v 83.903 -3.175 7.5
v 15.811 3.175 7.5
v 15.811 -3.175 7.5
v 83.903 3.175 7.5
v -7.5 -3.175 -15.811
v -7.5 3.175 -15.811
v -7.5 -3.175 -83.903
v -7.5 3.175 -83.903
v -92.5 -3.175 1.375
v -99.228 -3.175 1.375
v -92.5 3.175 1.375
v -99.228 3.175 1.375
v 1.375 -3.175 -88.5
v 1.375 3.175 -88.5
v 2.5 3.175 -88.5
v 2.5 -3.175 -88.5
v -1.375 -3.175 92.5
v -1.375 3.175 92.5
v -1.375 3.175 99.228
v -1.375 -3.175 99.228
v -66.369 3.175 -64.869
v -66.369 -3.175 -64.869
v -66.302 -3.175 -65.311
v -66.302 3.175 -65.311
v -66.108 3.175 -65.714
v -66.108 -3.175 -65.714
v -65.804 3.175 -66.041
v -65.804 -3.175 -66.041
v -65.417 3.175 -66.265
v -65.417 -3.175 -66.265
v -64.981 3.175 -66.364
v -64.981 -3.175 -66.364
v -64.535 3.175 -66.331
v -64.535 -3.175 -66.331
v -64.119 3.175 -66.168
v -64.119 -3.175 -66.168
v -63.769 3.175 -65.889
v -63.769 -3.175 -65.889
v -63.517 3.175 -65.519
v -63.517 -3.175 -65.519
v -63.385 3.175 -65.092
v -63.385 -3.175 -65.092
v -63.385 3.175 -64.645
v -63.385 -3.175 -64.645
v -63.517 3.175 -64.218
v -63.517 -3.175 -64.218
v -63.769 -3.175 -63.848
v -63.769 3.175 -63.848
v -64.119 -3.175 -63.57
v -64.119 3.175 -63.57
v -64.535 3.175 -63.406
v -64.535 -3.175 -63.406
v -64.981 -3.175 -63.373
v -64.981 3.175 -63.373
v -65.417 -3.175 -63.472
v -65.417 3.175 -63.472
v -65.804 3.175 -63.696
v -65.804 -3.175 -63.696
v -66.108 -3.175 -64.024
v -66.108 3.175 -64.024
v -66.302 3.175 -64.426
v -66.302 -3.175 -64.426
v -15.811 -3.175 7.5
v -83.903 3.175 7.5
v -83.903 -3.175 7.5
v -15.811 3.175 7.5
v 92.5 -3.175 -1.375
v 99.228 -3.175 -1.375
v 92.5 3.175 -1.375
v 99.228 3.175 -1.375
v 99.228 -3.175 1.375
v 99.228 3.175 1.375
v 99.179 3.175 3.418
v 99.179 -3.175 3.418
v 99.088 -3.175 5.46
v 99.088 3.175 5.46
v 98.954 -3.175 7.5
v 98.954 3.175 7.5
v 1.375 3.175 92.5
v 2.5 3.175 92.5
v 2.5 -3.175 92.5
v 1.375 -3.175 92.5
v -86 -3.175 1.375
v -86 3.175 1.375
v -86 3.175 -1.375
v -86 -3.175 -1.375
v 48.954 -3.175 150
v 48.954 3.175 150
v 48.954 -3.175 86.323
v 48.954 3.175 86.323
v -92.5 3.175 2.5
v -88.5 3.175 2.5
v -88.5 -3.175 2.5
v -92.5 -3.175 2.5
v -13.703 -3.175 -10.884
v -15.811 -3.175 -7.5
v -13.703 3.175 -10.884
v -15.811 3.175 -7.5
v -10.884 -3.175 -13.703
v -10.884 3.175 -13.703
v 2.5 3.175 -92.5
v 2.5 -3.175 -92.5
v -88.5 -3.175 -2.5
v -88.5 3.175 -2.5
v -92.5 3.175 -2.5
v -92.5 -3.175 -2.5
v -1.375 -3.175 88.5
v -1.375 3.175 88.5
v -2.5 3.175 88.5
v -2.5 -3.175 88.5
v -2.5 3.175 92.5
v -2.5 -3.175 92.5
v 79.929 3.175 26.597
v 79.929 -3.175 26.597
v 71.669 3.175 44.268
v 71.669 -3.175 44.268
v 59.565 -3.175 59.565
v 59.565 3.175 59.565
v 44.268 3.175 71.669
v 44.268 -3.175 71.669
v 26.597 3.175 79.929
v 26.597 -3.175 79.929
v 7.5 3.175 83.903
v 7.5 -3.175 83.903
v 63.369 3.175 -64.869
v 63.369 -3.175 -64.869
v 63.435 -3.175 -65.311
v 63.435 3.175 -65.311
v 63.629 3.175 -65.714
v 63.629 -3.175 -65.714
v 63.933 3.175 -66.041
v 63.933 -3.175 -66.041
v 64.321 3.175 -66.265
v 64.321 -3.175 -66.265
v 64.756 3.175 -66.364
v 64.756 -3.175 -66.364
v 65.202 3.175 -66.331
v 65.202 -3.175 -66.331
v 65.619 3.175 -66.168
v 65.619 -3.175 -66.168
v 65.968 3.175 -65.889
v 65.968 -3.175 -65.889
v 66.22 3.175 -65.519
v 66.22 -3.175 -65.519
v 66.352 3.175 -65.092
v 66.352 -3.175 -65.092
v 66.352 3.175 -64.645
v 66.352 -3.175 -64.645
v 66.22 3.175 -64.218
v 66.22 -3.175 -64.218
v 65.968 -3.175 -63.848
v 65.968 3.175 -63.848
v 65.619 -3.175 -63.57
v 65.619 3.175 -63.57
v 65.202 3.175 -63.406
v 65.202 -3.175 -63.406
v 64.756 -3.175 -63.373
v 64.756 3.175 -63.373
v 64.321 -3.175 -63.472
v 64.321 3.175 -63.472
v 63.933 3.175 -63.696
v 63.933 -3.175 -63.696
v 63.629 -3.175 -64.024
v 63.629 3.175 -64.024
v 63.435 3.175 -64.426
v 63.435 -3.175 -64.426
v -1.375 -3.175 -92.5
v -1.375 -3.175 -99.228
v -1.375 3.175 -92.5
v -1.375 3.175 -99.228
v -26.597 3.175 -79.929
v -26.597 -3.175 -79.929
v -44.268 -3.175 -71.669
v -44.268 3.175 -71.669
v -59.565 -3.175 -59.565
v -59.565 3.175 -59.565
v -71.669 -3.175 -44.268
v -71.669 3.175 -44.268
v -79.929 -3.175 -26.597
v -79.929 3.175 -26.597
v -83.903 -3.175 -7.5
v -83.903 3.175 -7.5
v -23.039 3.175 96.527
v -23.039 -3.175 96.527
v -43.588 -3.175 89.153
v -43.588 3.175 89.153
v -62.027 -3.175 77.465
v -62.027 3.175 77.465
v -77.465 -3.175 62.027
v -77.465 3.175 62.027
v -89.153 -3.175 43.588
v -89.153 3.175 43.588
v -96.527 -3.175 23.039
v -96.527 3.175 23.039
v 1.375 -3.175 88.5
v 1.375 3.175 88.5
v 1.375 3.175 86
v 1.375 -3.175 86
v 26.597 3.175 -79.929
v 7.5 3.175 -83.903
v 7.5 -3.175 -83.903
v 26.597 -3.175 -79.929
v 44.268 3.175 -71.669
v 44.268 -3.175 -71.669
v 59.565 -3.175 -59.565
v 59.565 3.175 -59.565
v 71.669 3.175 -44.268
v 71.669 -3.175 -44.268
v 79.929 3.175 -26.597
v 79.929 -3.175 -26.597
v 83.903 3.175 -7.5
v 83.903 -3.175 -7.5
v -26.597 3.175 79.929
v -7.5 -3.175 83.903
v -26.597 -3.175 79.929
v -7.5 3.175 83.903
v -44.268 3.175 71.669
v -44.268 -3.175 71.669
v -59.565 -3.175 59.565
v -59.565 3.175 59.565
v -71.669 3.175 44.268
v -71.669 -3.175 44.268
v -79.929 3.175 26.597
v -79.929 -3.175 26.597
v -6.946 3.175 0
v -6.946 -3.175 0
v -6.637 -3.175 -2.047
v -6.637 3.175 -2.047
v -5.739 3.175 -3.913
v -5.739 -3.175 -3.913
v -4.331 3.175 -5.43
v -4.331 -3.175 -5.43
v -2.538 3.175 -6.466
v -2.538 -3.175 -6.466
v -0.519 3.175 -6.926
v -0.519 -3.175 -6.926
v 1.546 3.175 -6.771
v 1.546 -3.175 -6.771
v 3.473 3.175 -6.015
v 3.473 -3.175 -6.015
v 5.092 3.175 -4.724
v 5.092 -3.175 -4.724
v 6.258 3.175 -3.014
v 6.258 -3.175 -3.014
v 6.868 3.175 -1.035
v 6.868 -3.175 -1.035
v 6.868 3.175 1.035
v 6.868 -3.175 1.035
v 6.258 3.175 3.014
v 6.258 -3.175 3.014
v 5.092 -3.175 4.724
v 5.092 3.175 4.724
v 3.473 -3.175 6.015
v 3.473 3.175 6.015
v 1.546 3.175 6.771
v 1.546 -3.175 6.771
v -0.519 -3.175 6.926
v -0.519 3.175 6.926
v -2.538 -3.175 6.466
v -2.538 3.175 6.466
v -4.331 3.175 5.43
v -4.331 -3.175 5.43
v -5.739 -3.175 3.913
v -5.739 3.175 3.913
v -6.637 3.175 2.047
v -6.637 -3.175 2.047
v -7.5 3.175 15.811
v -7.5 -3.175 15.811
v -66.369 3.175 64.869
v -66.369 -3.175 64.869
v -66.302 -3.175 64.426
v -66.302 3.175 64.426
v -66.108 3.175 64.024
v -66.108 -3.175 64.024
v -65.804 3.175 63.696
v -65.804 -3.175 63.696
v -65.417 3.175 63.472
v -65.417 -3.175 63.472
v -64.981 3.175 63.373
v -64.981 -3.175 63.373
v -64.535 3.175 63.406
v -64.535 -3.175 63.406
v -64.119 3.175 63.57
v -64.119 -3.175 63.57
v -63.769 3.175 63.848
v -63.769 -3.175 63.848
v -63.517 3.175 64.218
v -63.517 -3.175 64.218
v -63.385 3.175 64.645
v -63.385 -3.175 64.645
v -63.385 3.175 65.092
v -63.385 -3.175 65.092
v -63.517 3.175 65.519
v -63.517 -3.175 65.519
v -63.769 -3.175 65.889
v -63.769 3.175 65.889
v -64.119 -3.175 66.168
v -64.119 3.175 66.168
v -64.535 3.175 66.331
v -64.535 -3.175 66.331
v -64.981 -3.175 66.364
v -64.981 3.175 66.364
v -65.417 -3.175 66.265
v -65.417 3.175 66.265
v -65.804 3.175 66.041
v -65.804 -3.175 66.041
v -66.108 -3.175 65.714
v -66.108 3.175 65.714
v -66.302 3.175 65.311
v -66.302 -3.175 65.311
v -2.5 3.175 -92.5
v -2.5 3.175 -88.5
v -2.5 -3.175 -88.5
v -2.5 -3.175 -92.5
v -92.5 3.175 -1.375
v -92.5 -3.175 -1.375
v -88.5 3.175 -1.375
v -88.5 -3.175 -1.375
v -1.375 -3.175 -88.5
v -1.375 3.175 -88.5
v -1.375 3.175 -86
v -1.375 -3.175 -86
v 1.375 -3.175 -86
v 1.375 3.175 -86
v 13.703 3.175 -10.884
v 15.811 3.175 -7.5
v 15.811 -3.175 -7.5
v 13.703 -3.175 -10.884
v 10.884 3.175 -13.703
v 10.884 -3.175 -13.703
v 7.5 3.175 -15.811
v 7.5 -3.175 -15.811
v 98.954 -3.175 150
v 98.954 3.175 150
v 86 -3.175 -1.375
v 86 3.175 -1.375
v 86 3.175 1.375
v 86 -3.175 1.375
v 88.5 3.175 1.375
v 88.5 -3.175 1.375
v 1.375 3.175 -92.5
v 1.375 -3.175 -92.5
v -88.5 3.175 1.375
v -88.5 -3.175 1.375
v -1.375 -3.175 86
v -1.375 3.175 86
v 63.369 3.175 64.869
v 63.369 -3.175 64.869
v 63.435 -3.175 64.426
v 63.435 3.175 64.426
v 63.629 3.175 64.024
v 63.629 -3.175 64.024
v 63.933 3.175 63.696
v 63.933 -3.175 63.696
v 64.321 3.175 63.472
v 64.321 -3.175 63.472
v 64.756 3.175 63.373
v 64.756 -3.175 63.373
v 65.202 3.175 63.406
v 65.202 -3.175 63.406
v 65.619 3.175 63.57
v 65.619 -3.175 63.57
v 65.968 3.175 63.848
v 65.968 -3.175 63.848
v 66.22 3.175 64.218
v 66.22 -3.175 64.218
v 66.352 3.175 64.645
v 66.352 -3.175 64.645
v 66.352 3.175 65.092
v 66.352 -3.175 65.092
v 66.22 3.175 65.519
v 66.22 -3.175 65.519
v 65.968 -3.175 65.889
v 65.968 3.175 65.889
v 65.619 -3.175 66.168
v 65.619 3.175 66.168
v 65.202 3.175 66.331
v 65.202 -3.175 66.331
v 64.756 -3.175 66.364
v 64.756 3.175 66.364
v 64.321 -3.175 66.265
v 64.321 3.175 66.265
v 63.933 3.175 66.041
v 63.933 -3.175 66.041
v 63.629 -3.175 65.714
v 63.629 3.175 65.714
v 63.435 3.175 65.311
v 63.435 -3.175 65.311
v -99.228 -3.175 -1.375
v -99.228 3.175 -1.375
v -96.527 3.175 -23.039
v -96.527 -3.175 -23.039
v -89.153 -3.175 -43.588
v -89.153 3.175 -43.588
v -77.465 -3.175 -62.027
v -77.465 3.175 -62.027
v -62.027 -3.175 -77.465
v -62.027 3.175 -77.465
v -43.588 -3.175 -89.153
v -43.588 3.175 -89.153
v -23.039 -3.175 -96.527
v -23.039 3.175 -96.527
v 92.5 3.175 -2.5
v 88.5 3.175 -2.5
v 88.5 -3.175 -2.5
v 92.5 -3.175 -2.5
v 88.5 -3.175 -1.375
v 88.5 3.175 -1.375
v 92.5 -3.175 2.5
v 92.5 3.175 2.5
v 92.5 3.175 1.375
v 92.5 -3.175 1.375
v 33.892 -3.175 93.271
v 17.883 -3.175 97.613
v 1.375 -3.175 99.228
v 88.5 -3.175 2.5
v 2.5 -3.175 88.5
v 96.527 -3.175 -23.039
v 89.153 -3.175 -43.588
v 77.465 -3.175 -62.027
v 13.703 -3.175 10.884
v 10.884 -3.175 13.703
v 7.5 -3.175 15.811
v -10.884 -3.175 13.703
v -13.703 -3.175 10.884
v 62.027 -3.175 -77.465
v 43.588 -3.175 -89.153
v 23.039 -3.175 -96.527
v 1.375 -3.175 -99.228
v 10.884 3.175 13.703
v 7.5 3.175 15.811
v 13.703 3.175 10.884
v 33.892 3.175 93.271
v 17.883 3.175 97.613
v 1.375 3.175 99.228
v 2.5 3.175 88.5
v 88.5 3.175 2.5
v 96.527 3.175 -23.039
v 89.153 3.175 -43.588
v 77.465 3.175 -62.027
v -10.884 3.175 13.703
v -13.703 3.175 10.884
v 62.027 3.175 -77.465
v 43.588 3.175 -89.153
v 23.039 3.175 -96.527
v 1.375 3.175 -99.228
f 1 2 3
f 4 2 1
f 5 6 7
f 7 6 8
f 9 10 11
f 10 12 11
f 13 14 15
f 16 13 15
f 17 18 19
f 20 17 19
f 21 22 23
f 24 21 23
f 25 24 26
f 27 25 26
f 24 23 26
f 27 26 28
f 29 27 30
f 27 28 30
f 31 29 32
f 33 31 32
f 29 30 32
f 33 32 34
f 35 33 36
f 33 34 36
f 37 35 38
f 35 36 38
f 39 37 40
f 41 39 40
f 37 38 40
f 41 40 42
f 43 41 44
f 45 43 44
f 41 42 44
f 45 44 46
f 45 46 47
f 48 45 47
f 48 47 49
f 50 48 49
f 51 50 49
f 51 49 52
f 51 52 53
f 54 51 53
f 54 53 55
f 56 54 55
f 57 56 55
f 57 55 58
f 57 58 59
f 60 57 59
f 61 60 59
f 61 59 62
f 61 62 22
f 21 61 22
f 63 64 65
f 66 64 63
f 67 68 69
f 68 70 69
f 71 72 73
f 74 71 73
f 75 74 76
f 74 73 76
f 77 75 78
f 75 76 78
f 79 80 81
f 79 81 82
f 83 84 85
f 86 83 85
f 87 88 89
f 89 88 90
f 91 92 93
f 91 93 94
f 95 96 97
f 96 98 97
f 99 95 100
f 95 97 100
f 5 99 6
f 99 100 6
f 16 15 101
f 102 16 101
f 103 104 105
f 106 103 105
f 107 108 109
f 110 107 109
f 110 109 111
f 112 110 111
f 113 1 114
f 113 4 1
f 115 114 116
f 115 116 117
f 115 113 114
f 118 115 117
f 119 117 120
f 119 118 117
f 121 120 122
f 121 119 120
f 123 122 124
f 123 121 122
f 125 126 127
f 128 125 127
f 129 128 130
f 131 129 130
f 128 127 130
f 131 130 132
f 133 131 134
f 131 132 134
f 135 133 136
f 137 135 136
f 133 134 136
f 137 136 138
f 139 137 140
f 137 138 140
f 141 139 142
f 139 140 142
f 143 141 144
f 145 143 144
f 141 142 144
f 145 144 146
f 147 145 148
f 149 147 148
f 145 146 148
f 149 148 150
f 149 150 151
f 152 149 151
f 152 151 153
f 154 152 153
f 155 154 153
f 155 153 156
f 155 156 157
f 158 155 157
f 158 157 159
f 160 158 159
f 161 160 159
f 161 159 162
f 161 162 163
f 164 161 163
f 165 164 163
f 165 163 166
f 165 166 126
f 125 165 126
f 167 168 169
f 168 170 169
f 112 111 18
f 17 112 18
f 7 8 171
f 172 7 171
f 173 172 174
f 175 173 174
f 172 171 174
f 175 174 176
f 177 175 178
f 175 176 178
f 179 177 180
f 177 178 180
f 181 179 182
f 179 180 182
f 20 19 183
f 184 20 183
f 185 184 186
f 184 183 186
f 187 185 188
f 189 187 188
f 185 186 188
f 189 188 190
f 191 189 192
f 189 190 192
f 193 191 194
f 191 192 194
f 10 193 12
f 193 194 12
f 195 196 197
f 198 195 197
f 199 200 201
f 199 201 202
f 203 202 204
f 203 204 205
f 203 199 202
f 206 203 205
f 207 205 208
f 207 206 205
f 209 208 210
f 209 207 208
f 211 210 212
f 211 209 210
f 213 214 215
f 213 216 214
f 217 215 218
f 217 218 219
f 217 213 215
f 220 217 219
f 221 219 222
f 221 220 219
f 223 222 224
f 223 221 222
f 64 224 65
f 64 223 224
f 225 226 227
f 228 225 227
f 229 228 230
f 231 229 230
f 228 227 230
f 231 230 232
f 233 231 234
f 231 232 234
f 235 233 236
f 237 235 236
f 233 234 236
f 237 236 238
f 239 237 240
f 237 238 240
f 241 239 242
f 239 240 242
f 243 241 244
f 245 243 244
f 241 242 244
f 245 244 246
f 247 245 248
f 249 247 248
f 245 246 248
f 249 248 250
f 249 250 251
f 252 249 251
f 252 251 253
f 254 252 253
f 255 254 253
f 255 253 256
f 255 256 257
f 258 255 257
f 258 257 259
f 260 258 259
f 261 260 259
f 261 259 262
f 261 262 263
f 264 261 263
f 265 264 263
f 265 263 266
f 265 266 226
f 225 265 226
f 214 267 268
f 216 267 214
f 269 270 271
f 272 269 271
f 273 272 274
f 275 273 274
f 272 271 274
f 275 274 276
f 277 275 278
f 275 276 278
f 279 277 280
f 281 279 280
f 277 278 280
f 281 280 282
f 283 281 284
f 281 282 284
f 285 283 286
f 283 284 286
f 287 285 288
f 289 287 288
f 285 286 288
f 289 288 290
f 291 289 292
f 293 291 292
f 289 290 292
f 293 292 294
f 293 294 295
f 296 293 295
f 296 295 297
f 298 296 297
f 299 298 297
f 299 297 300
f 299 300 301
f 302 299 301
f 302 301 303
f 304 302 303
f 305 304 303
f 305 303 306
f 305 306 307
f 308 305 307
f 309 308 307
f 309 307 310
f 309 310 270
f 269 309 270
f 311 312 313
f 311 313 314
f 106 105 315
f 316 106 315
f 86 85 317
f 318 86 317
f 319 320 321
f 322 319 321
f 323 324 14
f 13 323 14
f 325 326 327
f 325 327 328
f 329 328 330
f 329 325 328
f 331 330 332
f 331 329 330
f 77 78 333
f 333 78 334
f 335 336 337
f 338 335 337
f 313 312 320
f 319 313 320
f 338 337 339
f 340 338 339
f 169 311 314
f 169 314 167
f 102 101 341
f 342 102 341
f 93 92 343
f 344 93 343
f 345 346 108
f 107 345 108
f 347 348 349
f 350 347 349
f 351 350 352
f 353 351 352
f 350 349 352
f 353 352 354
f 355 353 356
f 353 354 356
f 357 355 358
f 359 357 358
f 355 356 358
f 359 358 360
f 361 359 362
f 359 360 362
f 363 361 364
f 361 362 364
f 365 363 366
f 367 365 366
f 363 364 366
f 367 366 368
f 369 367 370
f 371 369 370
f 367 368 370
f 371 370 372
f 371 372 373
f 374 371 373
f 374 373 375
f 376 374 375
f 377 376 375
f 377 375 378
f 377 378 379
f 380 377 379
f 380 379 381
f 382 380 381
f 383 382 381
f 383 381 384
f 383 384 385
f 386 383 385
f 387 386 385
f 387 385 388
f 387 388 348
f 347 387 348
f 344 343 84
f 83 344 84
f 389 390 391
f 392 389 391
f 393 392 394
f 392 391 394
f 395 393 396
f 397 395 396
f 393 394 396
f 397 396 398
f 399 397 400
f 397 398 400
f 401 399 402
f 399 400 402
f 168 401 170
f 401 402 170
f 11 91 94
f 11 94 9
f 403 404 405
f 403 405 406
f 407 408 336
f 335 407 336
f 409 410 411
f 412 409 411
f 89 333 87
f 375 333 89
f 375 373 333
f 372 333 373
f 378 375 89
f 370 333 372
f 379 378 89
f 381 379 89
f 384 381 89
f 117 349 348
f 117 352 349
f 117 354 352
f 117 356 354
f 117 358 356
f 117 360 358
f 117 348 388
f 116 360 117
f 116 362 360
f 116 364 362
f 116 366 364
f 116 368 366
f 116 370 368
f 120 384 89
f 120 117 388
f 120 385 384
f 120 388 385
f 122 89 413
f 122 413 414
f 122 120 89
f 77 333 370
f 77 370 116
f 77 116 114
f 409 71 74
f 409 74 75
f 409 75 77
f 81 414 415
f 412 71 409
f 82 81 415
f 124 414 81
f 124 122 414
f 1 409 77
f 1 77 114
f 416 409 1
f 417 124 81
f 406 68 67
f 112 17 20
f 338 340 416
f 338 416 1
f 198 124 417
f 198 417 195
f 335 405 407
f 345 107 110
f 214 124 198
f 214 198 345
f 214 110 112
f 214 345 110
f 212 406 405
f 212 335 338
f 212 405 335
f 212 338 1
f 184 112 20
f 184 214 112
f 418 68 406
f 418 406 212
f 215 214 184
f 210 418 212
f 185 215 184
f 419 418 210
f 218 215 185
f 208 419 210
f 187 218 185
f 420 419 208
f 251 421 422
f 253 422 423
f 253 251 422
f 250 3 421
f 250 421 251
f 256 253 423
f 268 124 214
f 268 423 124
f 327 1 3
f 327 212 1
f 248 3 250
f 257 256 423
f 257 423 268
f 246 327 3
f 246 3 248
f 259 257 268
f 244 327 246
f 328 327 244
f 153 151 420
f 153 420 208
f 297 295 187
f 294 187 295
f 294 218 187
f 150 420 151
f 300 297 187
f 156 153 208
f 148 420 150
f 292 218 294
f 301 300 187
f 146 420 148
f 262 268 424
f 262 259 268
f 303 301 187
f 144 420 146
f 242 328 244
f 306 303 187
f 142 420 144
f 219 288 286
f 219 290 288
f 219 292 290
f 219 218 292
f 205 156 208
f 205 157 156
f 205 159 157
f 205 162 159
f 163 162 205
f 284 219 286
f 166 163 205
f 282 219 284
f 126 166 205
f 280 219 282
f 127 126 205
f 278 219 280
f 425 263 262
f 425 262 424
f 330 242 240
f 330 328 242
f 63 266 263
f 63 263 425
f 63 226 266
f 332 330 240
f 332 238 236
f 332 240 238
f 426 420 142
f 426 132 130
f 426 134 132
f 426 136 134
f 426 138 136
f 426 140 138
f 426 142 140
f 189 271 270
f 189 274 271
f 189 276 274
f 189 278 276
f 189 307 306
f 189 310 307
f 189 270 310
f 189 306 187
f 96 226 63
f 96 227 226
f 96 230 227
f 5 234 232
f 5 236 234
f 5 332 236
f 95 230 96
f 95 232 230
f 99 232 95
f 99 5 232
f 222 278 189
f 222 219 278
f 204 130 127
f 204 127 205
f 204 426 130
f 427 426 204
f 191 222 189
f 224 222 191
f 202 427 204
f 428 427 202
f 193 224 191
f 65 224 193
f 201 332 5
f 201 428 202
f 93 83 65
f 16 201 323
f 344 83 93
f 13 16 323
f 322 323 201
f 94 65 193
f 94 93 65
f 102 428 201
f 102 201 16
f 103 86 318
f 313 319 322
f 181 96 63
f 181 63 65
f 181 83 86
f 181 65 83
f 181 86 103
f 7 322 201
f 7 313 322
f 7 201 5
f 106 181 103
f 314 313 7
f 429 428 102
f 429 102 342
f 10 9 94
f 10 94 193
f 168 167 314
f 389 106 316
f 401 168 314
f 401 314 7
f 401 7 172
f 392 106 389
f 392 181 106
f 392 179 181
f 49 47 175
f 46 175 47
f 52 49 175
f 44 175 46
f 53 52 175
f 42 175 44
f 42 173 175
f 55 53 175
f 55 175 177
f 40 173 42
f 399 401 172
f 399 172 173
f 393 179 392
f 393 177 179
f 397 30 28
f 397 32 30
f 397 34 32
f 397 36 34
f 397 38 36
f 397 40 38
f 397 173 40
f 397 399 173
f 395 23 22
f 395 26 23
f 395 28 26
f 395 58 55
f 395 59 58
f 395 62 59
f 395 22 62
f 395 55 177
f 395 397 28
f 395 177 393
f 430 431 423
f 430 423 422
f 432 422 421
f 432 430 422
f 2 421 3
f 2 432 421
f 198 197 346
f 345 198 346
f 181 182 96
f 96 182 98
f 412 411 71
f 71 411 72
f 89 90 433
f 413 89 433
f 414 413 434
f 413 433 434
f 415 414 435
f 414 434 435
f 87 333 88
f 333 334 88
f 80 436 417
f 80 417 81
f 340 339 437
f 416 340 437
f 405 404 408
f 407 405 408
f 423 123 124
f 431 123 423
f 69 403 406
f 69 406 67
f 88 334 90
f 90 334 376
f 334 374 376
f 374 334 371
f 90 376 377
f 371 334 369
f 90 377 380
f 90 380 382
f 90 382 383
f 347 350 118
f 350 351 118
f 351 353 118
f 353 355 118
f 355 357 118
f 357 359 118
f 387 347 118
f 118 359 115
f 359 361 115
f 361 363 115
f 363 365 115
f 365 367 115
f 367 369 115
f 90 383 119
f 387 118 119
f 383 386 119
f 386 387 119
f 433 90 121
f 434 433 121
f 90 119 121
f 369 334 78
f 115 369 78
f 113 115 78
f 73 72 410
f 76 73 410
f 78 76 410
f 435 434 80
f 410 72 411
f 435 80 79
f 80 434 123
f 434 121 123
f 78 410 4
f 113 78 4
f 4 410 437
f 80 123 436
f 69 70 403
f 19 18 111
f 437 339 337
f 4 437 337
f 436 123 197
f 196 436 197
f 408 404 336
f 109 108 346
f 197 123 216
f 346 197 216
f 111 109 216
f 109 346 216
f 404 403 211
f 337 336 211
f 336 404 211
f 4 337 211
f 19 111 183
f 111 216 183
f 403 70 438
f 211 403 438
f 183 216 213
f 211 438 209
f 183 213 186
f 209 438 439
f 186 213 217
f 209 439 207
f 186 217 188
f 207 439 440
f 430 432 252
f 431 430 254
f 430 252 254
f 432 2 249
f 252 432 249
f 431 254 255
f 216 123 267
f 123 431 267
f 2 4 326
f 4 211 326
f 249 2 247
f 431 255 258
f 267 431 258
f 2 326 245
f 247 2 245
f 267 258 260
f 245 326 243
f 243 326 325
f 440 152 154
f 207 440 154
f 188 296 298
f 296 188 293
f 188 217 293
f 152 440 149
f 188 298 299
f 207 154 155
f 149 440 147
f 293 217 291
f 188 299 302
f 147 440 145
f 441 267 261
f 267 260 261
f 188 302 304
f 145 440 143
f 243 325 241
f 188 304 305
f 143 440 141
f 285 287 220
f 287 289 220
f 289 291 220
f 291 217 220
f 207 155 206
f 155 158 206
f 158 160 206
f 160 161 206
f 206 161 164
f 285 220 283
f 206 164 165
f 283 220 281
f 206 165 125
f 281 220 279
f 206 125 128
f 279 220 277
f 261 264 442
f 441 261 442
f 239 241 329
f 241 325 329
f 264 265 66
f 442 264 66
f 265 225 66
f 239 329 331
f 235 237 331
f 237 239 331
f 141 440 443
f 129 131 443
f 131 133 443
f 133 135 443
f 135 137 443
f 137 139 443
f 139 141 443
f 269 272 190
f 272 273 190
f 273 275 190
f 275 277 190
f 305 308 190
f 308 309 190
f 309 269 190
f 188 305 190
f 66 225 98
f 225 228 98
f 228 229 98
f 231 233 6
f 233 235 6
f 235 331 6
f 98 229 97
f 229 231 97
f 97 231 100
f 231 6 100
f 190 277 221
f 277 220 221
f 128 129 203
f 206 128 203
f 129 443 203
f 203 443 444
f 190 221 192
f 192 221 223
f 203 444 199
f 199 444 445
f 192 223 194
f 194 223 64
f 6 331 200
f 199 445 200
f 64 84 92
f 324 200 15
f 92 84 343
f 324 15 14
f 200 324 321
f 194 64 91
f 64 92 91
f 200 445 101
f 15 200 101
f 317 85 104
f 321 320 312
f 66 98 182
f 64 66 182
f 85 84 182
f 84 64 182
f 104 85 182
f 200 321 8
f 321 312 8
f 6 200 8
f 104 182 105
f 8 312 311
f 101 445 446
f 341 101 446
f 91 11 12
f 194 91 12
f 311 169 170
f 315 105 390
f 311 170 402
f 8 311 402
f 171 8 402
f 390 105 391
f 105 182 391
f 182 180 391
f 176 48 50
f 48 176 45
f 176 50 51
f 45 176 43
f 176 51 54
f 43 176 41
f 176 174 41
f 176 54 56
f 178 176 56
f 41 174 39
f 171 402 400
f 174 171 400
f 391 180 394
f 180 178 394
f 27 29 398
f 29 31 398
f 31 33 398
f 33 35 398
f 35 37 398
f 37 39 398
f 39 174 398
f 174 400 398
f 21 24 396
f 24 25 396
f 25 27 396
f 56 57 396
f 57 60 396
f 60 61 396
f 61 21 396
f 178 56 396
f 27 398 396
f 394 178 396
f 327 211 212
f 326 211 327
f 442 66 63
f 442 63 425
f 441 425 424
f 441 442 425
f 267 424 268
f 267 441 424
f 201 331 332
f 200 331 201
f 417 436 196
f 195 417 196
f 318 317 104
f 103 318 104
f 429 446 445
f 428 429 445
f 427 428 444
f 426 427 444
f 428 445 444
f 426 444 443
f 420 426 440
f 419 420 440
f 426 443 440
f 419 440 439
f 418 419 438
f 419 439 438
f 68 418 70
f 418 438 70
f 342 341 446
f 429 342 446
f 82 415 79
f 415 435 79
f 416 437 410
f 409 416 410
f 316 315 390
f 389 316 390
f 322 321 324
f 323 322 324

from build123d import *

# Parameters (mm, degrees)
BOSS_EXTRUDE1_DEPTH      = 3.175
SKETCH2_W                = 2.75
SKETCH2_H                = 2.5
SKETCH2_H_2              = 4
SKETCH2_W_2              = 1.125
SKETCH2_H_3              = 7.5
CUT_EXTRUDE1_DEPTH       = 180.884021717
CIRPATTERN1_COUNT        = 4
F_3_0_3_DIAMETER_HOLE1_D = 3
F_1_2_CLEARANCE_HOLE1_D  = 13.89126


with BuildPart() as part:
    # Sketch1 → Boss-Extrude1 (new, symmetric)
    with BuildSketch(Plane(origin=(0, 0, 0), x_dir=(1, 0, 0), z_dir=(0, 1, 0))):
        with BuildLine():
            Line((98.95418457, -7.5), (98.95418457, -150))
            Line((98.95418457, -150), (48.95418457, -150))
            Line((48.95418457, -150), (48.95418457, -86.323047079))
            ThreePointArc((48.95418457, -86.323047079), (-83.800295961, 53.157229431), (98.95418457, -7.5))
        make_face()
        with BuildLine():
            Line((-83.903460262, -7.5), (-15.811388301, -7.5))
            ThreePointArc((-15.811388301, -7.5), (-12.374368671, -12.374368671), (-7.5, -15.811388301))
            Line((-7.5, -15.811388301), (-7.5, -83.903460262))
            ThreePointArc((-7.5, -83.903460262), (-59.565261034, -59.565261034), (-83.903460262, -7.5))
        make_face(mode=Mode.SUBTRACT)
        with BuildLine():
            Line((7.5, -83.903460262), (7.5, -15.811388301))
            ThreePointArc((7.5, -15.811388301), (12.374368671, -12.374368671), (15.811388301, -7.5))
            Line((15.811388301, -7.5), (83.903460262, -7.5))
            ThreePointArc((83.903460262, -7.5), (59.565261034, -59.565261034), (7.5, -83.903460262))
        make_face(mode=Mode.SUBTRACT)
        with BuildLine():
            Line((-83.903460262, 7.5), (-15.811388301, 7.5))
            ThreePointArc((-15.811388301, 7.5), (-12.374368671, 12.374368671), (-7.5, 15.811388301))
            Line((-7.5, 15.811388301), (-7.5, 83.903460262))
            ThreePointArc((-7.5, 83.903460262), (-59.565261034, 59.565261034), (-83.903460262, 7.5))
        make_face(mode=Mode.SUBTRACT)
        with BuildLine():
            Line((7.5, 15.811388301), (7.5, 83.903460262))
            ThreePointArc((7.5, 83.903460262), (59.565261034, 59.565261034), (83.903460262, 7.5))
            Line((83.903460262, 7.5), (15.811388301, 7.5))
            ThreePointArc((15.811388301, 7.5), (12.374368671, 12.374368671), (7.5, 15.811388301))
        make_face(mode=Mode.SUBTRACT)
    extrude(amount=BOSS_EXTRUDE1_DEPTH, both=True)

    # Sketch2 → Cut-Extrude1 (cut, symmetric)
    with BuildSketch(Plane(origin=(0, 0, 0), x_dir=(1, 0, 0), z_dir=(0, 1, 0))):
        with Locations((0, 87.25)):
            Rectangle(SKETCH2_W, SKETCH2_H)
        with Locations((0, 90.5)):
            Rectangle(SKETCH2_W, SKETCH2_H_2)
        with Locations((1.9375, 90.5)):
            Rectangle(SKETCH2_W_2, SKETCH2_H_2)
        with Locations((0, 96.25)):
            Rectangle(SKETCH2_W, SKETCH2_H_3)
        with Locations((-1.9375, 90.5)):
            Rectangle(SKETCH2_W_2, SKETCH2_H_2)
    cut_extrude1 = extrude(amount=CUT_EXTRUDE1_DEPTH, both=True, mode=Mode.SUBTRACT)

    # CirPattern1: Cut-Extrude1 ×4 about axis
    cirpattern1_axis = Axis((0, 0, 0), (0, 1, 0))
    for i in range(1, CIRPATTERN1_COUNT):
        add(cut_extrude1.rotate(cirpattern1_axis, i * 360 / CIRPATTERN1_COUNT), mode=Mode.SUBTRACT)

    # Ø3.0 (3) Diameter Hole1 (through all)
    with Locations(Plane(origin=(0, 3.175, 0), x_dir=(1, 0, 0), z_dir=(0, 1, 0))):
        with Locations((-64.868561892, -64.868561892), (-64.868561892, 64.868561892), (64.868561892, 64.868561892), (64.868561892, -64.868561892)):
            Hole(F_3_0_3_DIAMETER_HOLE1_D / 2)

    # 1/2 Clearance Hole1 (through all)
    with Locations(Plane(origin=(0, 3.175, 0), x_dir=(1, 0, 0), z_dir=(0, 1, 0))):
        with Locations((0, 0)):
            Hole(F_1_2_CLEARANCE_HOLE1_D / 2)


solid = part.part
